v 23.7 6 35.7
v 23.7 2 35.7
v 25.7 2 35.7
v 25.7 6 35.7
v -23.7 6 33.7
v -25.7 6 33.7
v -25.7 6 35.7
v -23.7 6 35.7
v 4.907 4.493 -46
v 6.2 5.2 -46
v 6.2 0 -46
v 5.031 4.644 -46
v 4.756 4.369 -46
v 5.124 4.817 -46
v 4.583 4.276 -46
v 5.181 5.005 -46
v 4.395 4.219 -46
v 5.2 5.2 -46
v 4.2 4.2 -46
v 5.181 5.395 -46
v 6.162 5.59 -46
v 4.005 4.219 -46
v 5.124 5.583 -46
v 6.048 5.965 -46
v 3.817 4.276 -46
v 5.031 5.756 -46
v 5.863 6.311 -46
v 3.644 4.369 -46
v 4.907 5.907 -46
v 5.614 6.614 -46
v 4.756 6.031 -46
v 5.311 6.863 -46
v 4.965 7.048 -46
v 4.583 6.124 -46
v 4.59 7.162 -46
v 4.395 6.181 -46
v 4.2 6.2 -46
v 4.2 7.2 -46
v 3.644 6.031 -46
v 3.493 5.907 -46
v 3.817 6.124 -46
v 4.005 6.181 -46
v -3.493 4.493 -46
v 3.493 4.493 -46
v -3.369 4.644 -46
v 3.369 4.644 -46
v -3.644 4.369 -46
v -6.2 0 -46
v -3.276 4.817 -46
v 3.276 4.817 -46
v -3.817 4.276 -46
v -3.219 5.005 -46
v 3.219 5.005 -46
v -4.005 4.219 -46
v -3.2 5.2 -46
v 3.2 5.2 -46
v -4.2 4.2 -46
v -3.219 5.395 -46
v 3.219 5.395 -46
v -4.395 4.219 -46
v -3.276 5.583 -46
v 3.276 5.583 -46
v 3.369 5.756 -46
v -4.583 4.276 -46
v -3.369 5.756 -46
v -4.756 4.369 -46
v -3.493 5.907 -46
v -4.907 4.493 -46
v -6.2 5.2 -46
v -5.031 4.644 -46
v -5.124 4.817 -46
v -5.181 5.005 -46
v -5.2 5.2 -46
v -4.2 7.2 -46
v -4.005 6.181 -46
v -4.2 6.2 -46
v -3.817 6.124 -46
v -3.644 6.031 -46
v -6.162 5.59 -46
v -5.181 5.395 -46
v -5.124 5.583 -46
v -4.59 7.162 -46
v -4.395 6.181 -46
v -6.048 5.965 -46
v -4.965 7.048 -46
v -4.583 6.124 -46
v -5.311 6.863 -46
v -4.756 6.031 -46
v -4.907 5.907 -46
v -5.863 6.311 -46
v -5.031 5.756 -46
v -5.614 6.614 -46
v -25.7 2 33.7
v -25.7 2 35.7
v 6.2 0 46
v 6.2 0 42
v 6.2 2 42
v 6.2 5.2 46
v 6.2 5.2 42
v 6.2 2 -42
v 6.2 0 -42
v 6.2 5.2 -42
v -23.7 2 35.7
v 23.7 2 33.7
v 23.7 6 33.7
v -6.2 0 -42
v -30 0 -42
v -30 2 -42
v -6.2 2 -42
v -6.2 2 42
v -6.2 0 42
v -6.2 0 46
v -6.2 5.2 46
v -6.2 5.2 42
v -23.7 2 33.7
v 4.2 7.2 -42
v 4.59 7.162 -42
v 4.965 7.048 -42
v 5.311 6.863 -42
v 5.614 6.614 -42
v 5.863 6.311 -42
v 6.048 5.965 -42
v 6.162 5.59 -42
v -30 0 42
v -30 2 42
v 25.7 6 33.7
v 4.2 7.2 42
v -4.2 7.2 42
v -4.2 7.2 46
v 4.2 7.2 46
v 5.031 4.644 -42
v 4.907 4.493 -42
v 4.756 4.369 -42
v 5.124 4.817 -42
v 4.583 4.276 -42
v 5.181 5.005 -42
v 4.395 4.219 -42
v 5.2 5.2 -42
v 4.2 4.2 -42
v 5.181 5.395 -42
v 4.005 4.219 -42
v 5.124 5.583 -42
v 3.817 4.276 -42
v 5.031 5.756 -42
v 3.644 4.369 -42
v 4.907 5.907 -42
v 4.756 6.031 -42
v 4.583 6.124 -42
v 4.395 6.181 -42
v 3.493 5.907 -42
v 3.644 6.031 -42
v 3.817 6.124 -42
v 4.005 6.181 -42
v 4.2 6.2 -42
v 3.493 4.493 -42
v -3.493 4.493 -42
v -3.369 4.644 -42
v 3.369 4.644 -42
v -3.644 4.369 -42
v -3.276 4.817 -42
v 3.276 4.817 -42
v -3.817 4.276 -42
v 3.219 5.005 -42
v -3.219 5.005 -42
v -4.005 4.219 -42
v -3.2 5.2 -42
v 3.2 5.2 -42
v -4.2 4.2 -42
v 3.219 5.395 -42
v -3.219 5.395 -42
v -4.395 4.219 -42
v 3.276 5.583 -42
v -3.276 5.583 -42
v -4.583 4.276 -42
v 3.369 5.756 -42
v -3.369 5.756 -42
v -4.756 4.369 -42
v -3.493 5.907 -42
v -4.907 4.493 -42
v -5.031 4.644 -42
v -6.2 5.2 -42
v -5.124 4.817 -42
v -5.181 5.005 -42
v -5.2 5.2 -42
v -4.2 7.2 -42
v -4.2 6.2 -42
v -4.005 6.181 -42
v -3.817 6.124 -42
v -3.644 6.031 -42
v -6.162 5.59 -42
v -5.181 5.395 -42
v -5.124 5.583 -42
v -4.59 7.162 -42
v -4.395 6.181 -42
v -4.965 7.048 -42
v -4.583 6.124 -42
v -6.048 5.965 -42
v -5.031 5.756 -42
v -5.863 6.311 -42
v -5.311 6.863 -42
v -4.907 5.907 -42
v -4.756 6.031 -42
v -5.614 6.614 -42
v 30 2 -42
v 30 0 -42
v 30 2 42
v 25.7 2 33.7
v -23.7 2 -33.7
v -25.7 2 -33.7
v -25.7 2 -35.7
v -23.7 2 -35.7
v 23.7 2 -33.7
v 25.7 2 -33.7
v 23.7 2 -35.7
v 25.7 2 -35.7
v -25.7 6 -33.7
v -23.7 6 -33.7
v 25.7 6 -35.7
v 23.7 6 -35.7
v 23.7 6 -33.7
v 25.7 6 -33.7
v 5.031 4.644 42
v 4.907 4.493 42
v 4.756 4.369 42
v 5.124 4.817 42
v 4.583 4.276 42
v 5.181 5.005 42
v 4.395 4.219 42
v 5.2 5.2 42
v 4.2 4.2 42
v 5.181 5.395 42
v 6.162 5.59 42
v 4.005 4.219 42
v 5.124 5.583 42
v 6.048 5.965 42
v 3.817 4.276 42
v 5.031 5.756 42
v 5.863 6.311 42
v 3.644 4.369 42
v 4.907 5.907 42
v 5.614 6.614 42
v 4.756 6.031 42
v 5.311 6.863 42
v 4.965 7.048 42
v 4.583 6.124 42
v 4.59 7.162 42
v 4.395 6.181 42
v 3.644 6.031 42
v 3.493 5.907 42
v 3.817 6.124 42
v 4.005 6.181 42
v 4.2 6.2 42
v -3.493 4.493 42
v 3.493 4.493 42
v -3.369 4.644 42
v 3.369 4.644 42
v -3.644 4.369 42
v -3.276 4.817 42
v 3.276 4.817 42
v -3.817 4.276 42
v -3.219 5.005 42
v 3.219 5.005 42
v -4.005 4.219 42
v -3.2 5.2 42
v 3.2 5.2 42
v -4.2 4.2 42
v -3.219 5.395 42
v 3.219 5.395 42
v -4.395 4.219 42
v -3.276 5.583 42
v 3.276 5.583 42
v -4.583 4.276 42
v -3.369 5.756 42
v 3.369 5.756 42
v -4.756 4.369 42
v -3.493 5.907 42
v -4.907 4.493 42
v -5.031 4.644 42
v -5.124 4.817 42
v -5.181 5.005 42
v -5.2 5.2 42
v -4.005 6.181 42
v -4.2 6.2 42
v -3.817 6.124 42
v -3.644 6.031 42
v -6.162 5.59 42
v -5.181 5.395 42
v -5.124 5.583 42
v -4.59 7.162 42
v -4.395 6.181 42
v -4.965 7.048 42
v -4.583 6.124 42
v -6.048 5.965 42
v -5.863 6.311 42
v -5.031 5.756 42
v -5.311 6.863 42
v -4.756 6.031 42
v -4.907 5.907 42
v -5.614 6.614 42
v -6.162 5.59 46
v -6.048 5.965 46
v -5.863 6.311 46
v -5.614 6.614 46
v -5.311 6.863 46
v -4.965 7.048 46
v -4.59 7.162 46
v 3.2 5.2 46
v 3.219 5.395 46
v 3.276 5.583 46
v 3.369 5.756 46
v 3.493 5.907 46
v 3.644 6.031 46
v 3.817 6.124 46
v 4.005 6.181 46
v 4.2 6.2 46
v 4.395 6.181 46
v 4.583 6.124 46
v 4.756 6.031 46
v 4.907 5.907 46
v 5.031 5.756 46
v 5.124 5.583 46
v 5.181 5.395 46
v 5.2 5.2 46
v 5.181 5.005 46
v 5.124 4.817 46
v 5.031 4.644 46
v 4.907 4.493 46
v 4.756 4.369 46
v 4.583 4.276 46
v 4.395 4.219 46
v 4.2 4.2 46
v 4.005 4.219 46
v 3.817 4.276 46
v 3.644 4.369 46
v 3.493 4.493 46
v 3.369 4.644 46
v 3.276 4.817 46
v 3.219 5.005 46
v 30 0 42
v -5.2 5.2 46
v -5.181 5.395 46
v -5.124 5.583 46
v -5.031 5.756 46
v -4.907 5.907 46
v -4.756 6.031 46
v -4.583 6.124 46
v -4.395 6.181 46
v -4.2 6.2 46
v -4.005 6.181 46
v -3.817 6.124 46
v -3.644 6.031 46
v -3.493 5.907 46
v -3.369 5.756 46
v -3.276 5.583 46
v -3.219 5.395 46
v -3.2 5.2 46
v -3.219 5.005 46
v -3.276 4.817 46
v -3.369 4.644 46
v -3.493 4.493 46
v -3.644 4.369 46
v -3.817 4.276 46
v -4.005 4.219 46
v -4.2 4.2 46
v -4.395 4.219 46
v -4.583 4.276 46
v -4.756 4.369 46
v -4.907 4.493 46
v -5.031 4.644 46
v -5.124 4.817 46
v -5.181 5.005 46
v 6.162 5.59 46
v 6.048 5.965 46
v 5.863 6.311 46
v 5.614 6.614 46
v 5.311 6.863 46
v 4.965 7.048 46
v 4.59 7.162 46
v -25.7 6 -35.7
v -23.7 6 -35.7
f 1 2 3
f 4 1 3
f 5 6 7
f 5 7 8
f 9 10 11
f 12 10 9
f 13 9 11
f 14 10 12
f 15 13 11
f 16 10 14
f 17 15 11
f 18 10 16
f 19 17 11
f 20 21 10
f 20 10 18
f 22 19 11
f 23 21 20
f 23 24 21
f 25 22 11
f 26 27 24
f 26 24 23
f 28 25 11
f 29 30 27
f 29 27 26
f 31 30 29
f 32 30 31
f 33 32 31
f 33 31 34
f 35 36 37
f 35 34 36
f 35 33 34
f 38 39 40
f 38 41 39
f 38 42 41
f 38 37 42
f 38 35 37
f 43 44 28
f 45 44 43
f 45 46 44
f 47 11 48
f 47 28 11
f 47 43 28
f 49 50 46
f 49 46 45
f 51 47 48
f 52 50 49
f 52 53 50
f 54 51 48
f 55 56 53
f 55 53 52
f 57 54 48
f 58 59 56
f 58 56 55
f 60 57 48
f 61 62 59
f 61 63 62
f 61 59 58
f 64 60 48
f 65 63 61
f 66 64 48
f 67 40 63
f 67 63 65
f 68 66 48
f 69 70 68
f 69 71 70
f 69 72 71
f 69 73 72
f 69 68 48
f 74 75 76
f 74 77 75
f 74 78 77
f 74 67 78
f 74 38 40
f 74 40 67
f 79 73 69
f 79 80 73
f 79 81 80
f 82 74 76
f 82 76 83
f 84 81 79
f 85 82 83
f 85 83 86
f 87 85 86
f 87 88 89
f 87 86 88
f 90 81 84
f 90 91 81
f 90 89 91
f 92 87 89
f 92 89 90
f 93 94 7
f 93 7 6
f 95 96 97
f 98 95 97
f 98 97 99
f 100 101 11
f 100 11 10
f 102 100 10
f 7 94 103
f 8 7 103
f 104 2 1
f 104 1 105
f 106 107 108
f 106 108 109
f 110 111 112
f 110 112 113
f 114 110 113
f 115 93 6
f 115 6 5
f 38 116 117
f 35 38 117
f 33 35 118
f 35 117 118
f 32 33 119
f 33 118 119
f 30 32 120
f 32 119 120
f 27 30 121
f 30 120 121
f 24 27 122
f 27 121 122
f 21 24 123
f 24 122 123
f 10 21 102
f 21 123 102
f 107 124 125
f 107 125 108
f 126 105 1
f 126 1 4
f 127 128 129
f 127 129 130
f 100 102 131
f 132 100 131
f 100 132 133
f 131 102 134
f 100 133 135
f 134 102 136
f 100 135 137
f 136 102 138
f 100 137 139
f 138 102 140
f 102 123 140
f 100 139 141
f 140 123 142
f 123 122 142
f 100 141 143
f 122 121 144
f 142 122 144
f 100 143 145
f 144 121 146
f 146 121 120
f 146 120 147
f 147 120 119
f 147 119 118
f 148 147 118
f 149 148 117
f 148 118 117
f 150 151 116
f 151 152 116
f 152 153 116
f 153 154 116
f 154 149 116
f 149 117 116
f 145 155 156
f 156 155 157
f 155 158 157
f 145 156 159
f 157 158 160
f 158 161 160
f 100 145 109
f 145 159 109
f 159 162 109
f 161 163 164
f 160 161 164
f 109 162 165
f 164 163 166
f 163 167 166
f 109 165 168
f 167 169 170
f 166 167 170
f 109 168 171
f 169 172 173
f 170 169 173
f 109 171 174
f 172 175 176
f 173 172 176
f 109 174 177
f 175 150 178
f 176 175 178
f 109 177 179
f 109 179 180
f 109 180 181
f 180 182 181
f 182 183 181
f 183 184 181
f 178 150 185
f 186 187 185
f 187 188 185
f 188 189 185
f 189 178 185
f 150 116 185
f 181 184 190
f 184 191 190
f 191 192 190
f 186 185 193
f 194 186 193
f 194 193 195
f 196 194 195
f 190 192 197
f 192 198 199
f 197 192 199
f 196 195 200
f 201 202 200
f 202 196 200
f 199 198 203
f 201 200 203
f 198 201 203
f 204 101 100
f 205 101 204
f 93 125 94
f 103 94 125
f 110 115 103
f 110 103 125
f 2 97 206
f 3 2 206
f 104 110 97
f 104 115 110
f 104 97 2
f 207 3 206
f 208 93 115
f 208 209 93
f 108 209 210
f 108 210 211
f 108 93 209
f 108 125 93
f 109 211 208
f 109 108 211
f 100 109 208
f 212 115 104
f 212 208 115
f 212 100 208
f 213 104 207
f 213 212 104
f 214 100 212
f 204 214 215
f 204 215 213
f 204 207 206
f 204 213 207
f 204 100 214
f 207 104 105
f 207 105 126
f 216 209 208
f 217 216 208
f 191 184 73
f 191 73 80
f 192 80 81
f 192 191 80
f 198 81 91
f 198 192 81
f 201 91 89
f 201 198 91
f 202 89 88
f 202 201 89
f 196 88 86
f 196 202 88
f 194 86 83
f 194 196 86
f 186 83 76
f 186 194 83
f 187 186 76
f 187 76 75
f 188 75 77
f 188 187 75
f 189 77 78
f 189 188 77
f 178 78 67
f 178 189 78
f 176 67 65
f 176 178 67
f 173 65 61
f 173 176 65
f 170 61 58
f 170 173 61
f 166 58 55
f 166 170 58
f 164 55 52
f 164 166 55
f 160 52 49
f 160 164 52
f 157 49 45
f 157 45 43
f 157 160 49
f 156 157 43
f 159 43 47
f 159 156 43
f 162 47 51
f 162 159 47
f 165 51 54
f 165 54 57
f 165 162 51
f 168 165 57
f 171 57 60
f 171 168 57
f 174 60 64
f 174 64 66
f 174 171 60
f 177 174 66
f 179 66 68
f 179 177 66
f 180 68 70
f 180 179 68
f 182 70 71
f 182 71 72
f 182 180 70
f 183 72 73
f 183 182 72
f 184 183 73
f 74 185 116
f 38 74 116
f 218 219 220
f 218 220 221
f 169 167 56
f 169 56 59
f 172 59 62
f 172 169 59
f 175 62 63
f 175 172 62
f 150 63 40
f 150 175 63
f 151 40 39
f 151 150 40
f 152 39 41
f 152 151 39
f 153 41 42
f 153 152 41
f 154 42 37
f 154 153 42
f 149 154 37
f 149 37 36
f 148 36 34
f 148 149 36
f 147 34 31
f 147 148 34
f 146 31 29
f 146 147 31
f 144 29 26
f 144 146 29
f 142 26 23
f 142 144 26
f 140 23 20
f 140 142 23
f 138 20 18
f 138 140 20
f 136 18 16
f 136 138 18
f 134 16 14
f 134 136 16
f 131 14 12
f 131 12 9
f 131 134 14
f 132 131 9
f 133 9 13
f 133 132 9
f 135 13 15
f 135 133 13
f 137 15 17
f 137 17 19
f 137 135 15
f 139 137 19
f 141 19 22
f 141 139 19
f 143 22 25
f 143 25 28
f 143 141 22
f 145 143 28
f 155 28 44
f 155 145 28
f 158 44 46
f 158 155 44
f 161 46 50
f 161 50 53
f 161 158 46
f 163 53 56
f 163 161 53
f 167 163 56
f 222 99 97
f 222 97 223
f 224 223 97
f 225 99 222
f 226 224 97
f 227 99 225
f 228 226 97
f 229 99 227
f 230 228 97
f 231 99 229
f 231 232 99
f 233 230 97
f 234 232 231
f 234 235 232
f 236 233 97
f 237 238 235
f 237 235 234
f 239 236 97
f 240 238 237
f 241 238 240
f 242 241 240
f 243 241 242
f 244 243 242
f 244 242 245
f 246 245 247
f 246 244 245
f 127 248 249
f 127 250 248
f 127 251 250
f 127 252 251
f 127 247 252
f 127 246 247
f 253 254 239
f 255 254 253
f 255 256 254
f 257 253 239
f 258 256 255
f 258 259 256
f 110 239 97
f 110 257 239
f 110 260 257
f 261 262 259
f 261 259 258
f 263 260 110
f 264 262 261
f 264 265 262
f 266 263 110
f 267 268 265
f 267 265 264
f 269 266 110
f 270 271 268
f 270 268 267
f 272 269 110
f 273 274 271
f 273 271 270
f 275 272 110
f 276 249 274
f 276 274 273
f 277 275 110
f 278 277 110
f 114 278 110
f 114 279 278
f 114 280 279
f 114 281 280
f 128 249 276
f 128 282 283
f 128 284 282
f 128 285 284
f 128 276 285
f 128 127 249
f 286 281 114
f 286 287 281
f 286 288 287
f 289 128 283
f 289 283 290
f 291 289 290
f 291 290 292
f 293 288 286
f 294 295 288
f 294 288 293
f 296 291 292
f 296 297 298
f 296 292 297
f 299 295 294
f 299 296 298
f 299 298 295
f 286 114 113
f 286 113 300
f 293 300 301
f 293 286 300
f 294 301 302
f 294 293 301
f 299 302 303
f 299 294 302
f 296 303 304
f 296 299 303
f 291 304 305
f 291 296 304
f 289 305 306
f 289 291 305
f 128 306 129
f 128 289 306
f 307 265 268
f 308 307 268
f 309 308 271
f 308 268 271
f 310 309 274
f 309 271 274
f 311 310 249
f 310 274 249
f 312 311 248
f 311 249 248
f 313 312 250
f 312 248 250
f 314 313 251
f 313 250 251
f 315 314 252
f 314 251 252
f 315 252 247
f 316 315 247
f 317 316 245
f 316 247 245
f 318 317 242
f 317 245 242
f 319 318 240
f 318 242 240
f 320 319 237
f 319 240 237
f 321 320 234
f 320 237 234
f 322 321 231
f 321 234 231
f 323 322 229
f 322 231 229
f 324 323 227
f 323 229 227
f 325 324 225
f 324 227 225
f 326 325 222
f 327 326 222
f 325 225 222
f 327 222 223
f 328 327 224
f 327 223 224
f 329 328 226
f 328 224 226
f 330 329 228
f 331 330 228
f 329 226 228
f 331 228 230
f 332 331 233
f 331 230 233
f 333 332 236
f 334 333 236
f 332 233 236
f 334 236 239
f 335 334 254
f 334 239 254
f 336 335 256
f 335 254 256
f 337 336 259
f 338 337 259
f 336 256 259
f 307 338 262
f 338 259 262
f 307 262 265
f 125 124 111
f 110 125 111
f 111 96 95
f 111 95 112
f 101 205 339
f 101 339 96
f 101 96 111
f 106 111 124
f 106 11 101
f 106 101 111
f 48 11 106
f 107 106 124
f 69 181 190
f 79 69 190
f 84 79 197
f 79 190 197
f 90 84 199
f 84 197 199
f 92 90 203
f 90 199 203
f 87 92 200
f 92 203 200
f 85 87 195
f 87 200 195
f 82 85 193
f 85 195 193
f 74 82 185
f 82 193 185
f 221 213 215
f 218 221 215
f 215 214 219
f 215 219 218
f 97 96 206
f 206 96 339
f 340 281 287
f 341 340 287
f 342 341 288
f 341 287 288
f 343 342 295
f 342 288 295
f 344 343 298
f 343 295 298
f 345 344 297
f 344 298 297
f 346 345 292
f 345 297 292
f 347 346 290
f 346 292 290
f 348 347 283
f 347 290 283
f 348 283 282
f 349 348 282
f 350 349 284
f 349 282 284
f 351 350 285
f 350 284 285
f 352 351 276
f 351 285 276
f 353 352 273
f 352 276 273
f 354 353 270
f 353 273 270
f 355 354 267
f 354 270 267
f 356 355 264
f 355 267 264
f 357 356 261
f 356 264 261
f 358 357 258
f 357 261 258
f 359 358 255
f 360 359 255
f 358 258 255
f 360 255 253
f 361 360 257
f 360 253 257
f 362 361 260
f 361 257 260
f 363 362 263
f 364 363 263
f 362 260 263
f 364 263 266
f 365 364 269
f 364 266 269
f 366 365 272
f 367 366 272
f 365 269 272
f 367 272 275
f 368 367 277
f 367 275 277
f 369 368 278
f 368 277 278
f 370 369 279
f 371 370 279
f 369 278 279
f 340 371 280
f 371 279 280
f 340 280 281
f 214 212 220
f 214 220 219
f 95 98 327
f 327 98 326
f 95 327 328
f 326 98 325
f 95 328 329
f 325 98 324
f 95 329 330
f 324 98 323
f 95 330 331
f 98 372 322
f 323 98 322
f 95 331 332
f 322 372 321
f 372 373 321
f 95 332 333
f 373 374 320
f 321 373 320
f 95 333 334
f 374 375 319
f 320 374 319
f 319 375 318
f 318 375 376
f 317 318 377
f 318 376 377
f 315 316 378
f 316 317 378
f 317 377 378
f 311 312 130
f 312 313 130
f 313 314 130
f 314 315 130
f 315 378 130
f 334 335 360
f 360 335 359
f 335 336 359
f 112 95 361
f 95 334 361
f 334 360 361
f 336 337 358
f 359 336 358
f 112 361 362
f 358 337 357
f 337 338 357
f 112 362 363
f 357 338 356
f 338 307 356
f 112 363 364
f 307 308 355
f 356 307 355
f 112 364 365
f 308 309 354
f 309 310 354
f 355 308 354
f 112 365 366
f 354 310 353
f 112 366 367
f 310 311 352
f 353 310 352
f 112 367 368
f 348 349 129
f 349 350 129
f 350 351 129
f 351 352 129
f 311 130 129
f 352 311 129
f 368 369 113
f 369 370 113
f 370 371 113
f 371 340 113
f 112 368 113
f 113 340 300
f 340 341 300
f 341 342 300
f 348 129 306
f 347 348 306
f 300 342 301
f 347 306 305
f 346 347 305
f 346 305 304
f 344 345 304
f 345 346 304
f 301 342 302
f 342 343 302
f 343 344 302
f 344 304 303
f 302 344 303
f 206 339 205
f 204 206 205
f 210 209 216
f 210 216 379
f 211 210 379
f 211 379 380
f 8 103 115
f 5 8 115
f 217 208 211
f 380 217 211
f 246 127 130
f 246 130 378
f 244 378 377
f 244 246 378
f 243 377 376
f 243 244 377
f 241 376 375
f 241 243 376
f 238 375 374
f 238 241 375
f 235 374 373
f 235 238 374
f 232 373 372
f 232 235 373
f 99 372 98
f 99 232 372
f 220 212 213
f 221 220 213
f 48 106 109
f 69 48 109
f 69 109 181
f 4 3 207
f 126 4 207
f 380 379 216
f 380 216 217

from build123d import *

# Parameters (mm, degrees)
SKETCH1_W           = 60
SKETCH1_H           = 84
BOSS_EXTRUDE1_DEPTH = 2
SKETCH4_W           = 2
SKETCH4_H           = 2
BOSS_EXTRUDE3_DEPTH = 4
SKETCH5_W           = 12.4
SKETCH5_H           = 2
SKETCH5_R           = 2
SKETCH5_R_2         = 1
BOSS_EXTRUDE4_DEPTH = 4


with BuildPart() as part:
    # Sketch1 → Boss-Extrude1 (new body)
    with BuildSketch(Plane(origin=(0, 0, 0), x_dir=(1, 0, 0), z_dir=(0, 1, 0))):
        Rectangle(SKETCH1_W, SKETCH1_H)
    extrude(amount=BOSS_EXTRUDE1_DEPTH)

    # Sketch4 → Boss-Extrude3 (add)
    with BuildSketch(Plane(origin=(0, 2, 0), x_dir=(1, 0, 0), z_dir=(0, 1, 0))):
        with Locations((-24.7, 34.7)):
            Rectangle(SKETCH4_W, SKETCH4_H)
        with Locations((24.7, 34.7)):
            Rectangle(SKETCH4_W, SKETCH4_H)
        with Locations((24.7, -34.7)):
            Rectangle(SKETCH4_W, SKETCH4_H)
        with Locations((-24.7, -34.7)):
            Rectangle(SKETCH4_W, SKETCH4_H)
    extrude(amount=BOSS_EXTRUDE3_DEPTH)

    # Sketch5 → Boss-Extrude4 (add)
    # profile 1 of 4: a face of its own
    with BuildSketch(Plane(origin=(0, 0, -42), x_dir=(-1, 0, 0), z_dir=(0, 0, -1))):
        with Locations((0, 1)):
            Rectangle(SKETCH5_W, SKETCH5_H)
    # profile 2 of 4: a face of its own
    with BuildSketch(Plane(origin=(0, 0, -42), x_dir=(-1, 0, 0), z_dir=(0, 0, -1))):
        with BuildLine():
            ThreePointArc((-2.2, 5.2), (-4.2, 3.2), (-6.2, 5.2))
            Line((-6.2, 5.2), (-6.2, 2))
            Line((-6.2, 2), (6.2, 2))
            Line((6.2, 2), (6.2, 5.2))
            ThreePointArc((6.2, 5.2), (2.785786438, 3.785786438), (4.2, 7.2))
            Line((4.2, 7.2), (-4.2, 7.2))
            ThreePointArc((-4.2, 7.2), (-2.785786438, 6.614213562), (-2.2, 5.2))
        make_face()
    # profile 3 of 4: a face of its own
    with BuildSketch(Plane(origin=(0, 0, -42), x_dir=(-1, 0, 0), z_dir=(0, 0, -1))):
        with Locations((-4.2, 5.2)):
            Circle(SKETCH5_R)
        with Locations((-4.2, 5.2)):
            Circle(SKETCH5_R_2, mode=Mode.SUBTRACT)
    # profile 4 of 4: a face of its own
    with BuildSketch(Plane(origin=(0, 0, -42), x_dir=(-1, 0, 0), z_dir=(0, 0, -1))):
        with Locations((4.2, 5.2)):
            Circle(SKETCH5_R)
        with Locations((4.2, 5.2)):
            Circle(SKETCH5_R_2, mode=Mode.SUBTRACT)
    boss_extrude4 = extrude(amount=BOSS_EXTRUDE4_DEPTH)

    # Mirror1: Boss-Extrude4 across plane
    add(boss_extrude4.mirror(Plane.XY))


solid = part.part
